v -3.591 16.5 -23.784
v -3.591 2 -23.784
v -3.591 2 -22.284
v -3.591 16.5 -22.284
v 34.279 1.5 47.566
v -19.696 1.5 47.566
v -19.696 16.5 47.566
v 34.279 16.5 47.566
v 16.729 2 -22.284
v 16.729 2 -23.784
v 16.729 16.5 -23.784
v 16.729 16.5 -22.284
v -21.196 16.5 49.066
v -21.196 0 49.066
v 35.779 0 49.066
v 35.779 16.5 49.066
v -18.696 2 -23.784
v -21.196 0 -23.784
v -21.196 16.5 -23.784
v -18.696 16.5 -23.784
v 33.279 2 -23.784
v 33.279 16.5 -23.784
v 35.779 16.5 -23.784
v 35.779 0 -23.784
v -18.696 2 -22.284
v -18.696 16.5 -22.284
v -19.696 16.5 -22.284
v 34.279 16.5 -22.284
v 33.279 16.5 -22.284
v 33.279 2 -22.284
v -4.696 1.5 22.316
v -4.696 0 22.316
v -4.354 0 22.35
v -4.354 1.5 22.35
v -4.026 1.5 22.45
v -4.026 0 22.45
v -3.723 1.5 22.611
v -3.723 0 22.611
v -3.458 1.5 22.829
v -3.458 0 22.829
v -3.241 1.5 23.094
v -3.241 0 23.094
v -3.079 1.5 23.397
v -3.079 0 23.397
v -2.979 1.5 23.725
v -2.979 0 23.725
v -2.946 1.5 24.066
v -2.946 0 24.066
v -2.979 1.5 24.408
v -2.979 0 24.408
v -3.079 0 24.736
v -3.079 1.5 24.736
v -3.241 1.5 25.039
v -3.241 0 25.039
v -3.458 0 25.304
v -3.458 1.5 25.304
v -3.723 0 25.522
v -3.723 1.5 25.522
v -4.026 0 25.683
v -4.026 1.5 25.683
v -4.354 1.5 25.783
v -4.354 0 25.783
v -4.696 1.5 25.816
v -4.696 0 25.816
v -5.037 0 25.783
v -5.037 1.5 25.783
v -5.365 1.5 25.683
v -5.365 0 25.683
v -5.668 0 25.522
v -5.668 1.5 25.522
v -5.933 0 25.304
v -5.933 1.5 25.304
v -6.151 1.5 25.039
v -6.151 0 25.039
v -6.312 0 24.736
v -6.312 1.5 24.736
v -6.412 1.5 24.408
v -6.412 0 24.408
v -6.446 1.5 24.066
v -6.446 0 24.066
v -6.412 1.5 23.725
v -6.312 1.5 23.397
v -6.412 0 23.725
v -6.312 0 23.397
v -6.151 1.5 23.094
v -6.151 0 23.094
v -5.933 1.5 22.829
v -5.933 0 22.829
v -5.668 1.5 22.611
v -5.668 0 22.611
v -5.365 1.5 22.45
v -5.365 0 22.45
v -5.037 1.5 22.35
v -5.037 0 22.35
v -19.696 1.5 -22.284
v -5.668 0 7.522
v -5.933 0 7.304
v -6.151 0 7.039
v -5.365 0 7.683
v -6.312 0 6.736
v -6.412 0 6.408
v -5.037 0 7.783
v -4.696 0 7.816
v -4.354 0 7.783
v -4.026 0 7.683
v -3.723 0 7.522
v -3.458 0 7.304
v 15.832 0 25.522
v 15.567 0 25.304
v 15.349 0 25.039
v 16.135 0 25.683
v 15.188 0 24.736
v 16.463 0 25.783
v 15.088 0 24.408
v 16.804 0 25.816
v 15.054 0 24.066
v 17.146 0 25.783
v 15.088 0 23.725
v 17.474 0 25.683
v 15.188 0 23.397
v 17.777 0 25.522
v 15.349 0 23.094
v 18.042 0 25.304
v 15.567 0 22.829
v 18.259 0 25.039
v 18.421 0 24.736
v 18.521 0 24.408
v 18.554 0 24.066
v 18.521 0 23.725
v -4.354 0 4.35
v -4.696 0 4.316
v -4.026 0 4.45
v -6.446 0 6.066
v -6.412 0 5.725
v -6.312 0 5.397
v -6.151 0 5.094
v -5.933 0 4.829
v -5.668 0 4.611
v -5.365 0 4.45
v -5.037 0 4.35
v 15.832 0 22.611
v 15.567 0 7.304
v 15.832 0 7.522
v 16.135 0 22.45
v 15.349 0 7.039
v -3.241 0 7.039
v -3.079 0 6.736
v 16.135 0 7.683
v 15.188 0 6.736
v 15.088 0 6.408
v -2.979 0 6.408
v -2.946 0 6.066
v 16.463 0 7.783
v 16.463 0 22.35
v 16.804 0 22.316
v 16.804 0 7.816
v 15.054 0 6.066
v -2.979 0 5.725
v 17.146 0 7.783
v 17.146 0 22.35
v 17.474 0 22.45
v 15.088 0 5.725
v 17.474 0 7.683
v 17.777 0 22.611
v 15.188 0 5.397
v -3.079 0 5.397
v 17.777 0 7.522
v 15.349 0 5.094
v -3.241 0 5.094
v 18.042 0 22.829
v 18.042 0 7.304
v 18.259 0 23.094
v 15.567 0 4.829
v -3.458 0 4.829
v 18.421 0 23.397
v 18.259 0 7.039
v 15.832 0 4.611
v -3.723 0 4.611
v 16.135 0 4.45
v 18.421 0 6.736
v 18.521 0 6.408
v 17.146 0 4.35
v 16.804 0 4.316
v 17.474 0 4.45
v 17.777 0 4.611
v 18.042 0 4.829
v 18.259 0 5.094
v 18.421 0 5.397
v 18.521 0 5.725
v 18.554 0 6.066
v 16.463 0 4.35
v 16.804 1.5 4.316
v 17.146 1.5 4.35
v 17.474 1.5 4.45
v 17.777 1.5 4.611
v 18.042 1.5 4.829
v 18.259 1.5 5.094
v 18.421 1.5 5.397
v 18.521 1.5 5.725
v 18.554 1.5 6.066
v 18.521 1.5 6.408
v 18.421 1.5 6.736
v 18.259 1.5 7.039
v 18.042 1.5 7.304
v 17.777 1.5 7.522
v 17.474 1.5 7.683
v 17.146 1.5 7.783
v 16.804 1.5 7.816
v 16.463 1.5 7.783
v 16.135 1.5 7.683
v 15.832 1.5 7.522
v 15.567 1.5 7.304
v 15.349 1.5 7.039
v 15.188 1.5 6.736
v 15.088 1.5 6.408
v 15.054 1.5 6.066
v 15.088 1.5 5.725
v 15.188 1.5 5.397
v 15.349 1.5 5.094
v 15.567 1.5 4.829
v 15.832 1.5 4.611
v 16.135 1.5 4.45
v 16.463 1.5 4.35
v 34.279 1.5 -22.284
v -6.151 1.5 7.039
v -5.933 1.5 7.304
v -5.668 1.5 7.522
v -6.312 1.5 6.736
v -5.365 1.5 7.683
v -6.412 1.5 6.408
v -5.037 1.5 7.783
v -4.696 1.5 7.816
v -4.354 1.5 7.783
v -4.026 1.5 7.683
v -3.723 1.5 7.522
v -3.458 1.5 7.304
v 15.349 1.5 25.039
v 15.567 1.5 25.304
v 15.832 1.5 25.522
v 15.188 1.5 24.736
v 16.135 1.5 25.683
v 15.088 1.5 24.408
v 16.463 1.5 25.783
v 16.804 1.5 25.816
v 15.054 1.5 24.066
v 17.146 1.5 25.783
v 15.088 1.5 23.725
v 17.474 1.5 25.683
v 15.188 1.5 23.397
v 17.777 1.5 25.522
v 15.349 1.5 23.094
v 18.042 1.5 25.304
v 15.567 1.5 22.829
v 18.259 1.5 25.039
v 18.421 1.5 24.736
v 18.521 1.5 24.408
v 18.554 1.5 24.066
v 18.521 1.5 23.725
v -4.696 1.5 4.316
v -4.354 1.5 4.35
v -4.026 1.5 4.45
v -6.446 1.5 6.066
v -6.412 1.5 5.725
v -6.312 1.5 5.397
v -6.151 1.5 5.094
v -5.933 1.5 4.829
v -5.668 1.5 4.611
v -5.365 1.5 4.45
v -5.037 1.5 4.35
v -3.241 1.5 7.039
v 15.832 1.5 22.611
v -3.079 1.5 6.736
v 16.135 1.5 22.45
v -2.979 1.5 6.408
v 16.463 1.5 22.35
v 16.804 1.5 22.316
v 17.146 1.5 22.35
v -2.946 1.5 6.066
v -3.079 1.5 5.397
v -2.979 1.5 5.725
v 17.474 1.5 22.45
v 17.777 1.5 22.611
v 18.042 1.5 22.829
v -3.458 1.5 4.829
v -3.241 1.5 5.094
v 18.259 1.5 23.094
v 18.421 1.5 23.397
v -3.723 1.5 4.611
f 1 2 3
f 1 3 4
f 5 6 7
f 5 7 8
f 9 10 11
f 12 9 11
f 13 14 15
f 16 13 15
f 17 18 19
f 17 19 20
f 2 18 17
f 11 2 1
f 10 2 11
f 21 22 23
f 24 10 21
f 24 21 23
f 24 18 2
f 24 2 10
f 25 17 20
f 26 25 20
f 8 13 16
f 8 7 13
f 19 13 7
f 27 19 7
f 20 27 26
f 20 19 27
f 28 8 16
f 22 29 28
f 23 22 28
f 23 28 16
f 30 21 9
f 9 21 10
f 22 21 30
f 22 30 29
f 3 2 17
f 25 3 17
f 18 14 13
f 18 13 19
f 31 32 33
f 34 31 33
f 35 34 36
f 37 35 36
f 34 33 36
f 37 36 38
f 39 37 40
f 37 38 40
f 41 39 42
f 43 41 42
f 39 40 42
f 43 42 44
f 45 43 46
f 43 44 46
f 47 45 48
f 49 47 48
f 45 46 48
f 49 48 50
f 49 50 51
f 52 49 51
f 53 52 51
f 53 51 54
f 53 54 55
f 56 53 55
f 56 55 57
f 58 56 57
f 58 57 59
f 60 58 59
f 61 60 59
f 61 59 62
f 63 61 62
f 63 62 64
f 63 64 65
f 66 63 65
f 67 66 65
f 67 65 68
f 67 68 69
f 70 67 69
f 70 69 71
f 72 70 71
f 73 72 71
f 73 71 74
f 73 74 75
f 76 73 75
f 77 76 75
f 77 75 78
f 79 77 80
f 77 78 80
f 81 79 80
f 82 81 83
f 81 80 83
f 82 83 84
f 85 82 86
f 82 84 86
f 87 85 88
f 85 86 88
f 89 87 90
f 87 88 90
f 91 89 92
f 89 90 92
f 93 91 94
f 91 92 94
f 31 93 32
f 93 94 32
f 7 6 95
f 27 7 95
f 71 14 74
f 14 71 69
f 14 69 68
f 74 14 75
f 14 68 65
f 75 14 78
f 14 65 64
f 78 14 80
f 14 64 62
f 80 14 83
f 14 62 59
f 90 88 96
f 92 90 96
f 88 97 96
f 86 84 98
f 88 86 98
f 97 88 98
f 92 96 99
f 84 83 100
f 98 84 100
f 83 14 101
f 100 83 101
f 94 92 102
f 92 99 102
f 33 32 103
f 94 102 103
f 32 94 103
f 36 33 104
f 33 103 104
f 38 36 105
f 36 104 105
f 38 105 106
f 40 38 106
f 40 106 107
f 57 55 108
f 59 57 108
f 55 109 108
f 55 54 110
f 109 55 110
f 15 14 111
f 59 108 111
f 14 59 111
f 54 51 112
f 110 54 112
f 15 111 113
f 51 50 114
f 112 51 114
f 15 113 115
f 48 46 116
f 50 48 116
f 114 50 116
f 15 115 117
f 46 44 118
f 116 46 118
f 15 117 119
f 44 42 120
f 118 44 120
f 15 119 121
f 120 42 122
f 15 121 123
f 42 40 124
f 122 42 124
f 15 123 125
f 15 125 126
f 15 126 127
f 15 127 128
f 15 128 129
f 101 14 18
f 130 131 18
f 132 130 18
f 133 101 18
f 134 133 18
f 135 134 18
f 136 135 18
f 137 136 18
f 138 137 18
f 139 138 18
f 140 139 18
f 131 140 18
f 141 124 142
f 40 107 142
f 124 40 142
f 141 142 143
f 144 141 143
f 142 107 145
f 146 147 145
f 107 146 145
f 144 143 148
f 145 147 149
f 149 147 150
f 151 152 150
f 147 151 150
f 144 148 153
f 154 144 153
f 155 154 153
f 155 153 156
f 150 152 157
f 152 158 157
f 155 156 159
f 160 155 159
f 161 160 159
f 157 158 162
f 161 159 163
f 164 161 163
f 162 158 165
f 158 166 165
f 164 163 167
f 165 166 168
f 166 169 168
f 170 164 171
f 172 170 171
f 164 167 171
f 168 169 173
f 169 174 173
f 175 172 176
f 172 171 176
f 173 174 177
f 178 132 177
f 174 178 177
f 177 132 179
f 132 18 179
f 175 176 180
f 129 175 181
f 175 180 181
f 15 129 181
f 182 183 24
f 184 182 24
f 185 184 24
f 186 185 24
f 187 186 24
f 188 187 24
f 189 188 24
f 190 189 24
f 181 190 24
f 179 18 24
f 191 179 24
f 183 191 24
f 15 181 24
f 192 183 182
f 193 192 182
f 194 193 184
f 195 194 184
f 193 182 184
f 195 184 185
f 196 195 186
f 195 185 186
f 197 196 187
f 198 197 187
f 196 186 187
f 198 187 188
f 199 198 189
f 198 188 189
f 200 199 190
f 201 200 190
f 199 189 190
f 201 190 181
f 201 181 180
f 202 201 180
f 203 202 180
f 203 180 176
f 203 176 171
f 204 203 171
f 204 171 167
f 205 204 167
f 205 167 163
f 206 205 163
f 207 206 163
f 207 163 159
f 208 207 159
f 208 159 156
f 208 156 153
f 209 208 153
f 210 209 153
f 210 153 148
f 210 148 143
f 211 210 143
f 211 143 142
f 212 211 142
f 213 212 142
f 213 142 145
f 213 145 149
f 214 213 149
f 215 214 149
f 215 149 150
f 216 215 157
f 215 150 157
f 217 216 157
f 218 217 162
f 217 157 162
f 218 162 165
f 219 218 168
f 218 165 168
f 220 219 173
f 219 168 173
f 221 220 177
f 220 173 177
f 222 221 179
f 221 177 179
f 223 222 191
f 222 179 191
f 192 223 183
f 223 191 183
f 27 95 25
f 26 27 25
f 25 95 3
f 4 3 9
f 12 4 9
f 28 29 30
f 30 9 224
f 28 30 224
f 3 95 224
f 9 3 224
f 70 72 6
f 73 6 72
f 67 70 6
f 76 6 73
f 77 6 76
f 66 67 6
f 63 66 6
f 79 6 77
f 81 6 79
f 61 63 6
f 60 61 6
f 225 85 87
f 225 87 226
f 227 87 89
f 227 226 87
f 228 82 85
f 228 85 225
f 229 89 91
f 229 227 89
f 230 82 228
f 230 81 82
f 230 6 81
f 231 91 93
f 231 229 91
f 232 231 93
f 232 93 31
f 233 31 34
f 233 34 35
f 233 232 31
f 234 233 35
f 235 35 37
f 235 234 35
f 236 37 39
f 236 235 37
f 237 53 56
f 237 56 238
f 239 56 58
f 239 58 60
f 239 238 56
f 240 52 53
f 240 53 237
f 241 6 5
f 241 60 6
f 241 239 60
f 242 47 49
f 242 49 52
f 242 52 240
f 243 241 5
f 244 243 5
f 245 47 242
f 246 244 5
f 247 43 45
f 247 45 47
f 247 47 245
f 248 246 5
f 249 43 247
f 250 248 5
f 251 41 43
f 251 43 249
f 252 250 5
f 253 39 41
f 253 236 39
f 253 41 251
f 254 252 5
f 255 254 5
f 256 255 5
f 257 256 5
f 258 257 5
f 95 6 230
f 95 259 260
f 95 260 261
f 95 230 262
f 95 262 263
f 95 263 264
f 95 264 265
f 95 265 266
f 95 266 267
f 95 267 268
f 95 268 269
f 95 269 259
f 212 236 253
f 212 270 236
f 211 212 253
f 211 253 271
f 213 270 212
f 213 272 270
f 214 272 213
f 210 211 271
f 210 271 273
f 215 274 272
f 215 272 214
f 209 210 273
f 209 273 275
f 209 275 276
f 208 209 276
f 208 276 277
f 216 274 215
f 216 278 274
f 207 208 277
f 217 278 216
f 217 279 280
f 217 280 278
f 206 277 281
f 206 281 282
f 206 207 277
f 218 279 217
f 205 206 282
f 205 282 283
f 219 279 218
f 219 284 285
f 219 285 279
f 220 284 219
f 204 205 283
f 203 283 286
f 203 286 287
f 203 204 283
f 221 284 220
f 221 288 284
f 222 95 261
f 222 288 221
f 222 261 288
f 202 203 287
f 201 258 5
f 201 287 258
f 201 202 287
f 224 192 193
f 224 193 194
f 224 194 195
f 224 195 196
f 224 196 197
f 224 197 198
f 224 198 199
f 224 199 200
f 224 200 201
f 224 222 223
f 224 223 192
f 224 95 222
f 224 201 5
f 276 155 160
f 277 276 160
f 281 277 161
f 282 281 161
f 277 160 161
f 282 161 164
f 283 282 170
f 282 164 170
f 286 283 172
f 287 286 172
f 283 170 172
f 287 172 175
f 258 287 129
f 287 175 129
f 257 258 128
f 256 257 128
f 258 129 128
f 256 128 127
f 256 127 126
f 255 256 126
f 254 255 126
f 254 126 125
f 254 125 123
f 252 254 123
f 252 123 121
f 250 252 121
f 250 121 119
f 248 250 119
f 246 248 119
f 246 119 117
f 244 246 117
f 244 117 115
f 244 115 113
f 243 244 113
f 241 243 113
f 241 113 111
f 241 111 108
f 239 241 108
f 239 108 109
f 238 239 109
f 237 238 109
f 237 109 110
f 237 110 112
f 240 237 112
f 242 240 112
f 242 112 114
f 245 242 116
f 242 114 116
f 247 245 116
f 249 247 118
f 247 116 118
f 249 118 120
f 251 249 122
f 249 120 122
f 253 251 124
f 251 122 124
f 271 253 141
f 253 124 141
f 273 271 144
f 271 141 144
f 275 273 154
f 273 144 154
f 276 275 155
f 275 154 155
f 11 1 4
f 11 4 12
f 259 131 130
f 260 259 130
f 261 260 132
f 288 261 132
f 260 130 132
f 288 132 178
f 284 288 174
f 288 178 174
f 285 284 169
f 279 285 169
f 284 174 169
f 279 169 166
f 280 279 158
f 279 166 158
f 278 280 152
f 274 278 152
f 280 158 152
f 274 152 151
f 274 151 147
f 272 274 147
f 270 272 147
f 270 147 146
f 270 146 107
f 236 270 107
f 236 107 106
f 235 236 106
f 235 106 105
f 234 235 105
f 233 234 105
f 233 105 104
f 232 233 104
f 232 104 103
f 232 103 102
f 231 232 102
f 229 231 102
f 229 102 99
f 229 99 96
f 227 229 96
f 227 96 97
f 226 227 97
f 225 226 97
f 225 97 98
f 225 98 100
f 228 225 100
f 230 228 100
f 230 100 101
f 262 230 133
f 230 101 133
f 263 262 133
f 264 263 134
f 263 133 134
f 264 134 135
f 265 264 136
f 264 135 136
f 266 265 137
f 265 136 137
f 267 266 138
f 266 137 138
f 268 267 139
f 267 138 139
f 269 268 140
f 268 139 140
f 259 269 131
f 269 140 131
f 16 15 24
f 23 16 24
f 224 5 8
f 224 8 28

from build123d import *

# Parameters (mm, degrees)
SKETCH1_W           = 53.975
SKETCH1_H           = 69.85
BOSS_EXTRUDE1_DEPTH = 1.5
SKETCH1_4_W         = 56.975
SKETCH1_4_H         = 72.85
SKETCH1_4_W_2       = 53.975
SKETCH1_4_H_2       = 69.85
BOSS_EXTRUDE2_DEPTH = 16.5
CUT_EXTRUDE1_REACH  = 84.822
SKETCH2_W           = 16.55
SKETCH2_H           = 14.5
SKETCH2_W_2         = 15.105
CUT_EXTRUDE2_REACH  = 64.928
SKETCH3_R           = 1.75


with BuildPart() as part:
    # Sketch1 → Boss-Extrude1 (new body)
    with BuildSketch(Plane(origin=(0, 0, 0), x_dir=(1, 0, 0), z_dir=(0, 1, 0))):
        with Locations((7.2918379, -12.641495434)):
            Rectangle(SKETCH1_W, SKETCH1_H)
    extrude(amount=BOSS_EXTRUDE1_DEPTH)

    # Sketch1<4> → Boss-Extrude2 (add)
    with BuildSketch(Plane(origin=(0, 0, 0), x_dir=(1, 0, 0), z_dir=(0, 1, 0))):
        with Locations((7.2918379, -12.641495434)):
            Rectangle(SKETCH1_4_W, SKETCH1_4_H)
        with Locations((7.2918379, -12.641495434)):
            Rectangle(SKETCH1_4_W_2, SKETCH1_4_H_2, mode=Mode.SUBTRACT)
    extrude(amount=BOSS_EXTRUDE2_DEPTH)

    # Sketch2 → Cut-Extrude1 (cut, up to next)
    with BuildSketch(Plane(origin=(0, 0, -23.783504566), x_dir=(-1, 0, 0), z_dir=(0, 0, -1)), mode=Mode.PRIVATE) as cut_extrude1_sk1:
        with Locations((-25.0043379, 9.25)):
            Rectangle(SKETCH2_W, SKETCH2_H)
    cut_extrude1_tool1 = extrude(cut_extrude1_sk1.sketch, amount=-CUT_EXTRUDE1_REACH, mode=Mode.PRIVATE) & part.part
    # Sketch2 → Cut-Extrude1 (cut, up to next)
    with BuildSketch(Plane(origin=(0, 0, -23.783504566), x_dir=(-1, 0, 0), z_dir=(0, 0, -1)), mode=Mode.PRIVATE) as cut_extrude1_sk2:
        with Locations((11.1431621, 9.25)):
            Rectangle(SKETCH2_W_2, SKETCH2_H)
    cut_extrude1_tool2 = extrude(cut_extrude1_sk2.sketch, amount=-CUT_EXTRUDE1_REACH, mode=Mode.PRIVATE) & part.part
    add(cut_extrude1_tool1.solids().sort_by_distance((25.004338, 9.25, -23.783505))[0], mode=Mode.SUBTRACT)
    add(cut_extrude1_tool2.solids().sort_by_distance((-11.143162, 9.25, -23.783505))[0], mode=Mode.SUBTRACT)

    # Sketch3 → Cut-Extrude2 (cut, up to next)
    with BuildSketch(Plane.XZ, mode=Mode.PRIVATE) as cut_extrude2_sk1:
        with Locations((16.8043379, 24.066495434)):
            Circle(SKETCH3_R)
    cut_extrude2_tool1 = extrude(cut_extrude2_sk1.sketch, amount=-CUT_EXTRUDE2_REACH, mode=Mode.PRIVATE) & part.part
    # Sketch3 → Cut-Extrude2 (cut, up to next)
    with BuildSketch(Plane.XZ, mode=Mode.PRIVATE) as cut_extrude2_sk2:
        with Locations((-4.6956621, 24.066495434)):
            Circle(SKETCH3_R)
    cut_extrude2_tool2 = extrude(cut_extrude2_sk2.sketch, amount=-CUT_EXTRUDE2_REACH, mode=Mode.PRIVATE) & part.part
    # Sketch3 → Cut-Extrude2 (cut, up to next)
    with BuildSketch(Plane.XZ, mode=Mode.PRIVATE) as cut_extrude2_sk3:
        with Locations((16.8043379, 6.066495434)):
            Circle(SKETCH3_R)
    cut_extrude2_tool3 = extrude(cut_extrude2_sk3.sketch, amount=-CUT_EXTRUDE2_REACH, mode=Mode.PRIVATE) & part.part
    # Sketch3 → Cut-Extrude2 (cut, up to next)
    with BuildSketch(Plane.XZ, mode=Mode.PRIVATE) as cut_extrude2_sk4:
        with Locations((-4.6956621, 6.066495434)):
            Circle(SKETCH3_R)
    cut_extrude2_tool4 = extrude(cut_extrude2_sk4.sketch, amount=-CUT_EXTRUDE2_REACH, mode=Mode.PRIVATE) & part.part
    add(cut_extrude2_tool1.solids().sort_by_distance((16.804338, 0, 24.066495))[0], mode=Mode.SUBTRACT)
    add(cut_extrude2_tool2.solids().sort_by_distance((-4.695662, 0, 24.066495))[0], mode=Mode.SUBTRACT)
    add(cut_extrude2_tool3.solids().sort_by_distance((16.804338, 0, 6.066495))[0], mode=Mode.SUBTRACT)
    add(cut_extrude2_tool4.solids().sort_by_distance((-4.695662, 0, 6.066495))[0], mode=Mode.SUBTRACT)


solid = part.part
